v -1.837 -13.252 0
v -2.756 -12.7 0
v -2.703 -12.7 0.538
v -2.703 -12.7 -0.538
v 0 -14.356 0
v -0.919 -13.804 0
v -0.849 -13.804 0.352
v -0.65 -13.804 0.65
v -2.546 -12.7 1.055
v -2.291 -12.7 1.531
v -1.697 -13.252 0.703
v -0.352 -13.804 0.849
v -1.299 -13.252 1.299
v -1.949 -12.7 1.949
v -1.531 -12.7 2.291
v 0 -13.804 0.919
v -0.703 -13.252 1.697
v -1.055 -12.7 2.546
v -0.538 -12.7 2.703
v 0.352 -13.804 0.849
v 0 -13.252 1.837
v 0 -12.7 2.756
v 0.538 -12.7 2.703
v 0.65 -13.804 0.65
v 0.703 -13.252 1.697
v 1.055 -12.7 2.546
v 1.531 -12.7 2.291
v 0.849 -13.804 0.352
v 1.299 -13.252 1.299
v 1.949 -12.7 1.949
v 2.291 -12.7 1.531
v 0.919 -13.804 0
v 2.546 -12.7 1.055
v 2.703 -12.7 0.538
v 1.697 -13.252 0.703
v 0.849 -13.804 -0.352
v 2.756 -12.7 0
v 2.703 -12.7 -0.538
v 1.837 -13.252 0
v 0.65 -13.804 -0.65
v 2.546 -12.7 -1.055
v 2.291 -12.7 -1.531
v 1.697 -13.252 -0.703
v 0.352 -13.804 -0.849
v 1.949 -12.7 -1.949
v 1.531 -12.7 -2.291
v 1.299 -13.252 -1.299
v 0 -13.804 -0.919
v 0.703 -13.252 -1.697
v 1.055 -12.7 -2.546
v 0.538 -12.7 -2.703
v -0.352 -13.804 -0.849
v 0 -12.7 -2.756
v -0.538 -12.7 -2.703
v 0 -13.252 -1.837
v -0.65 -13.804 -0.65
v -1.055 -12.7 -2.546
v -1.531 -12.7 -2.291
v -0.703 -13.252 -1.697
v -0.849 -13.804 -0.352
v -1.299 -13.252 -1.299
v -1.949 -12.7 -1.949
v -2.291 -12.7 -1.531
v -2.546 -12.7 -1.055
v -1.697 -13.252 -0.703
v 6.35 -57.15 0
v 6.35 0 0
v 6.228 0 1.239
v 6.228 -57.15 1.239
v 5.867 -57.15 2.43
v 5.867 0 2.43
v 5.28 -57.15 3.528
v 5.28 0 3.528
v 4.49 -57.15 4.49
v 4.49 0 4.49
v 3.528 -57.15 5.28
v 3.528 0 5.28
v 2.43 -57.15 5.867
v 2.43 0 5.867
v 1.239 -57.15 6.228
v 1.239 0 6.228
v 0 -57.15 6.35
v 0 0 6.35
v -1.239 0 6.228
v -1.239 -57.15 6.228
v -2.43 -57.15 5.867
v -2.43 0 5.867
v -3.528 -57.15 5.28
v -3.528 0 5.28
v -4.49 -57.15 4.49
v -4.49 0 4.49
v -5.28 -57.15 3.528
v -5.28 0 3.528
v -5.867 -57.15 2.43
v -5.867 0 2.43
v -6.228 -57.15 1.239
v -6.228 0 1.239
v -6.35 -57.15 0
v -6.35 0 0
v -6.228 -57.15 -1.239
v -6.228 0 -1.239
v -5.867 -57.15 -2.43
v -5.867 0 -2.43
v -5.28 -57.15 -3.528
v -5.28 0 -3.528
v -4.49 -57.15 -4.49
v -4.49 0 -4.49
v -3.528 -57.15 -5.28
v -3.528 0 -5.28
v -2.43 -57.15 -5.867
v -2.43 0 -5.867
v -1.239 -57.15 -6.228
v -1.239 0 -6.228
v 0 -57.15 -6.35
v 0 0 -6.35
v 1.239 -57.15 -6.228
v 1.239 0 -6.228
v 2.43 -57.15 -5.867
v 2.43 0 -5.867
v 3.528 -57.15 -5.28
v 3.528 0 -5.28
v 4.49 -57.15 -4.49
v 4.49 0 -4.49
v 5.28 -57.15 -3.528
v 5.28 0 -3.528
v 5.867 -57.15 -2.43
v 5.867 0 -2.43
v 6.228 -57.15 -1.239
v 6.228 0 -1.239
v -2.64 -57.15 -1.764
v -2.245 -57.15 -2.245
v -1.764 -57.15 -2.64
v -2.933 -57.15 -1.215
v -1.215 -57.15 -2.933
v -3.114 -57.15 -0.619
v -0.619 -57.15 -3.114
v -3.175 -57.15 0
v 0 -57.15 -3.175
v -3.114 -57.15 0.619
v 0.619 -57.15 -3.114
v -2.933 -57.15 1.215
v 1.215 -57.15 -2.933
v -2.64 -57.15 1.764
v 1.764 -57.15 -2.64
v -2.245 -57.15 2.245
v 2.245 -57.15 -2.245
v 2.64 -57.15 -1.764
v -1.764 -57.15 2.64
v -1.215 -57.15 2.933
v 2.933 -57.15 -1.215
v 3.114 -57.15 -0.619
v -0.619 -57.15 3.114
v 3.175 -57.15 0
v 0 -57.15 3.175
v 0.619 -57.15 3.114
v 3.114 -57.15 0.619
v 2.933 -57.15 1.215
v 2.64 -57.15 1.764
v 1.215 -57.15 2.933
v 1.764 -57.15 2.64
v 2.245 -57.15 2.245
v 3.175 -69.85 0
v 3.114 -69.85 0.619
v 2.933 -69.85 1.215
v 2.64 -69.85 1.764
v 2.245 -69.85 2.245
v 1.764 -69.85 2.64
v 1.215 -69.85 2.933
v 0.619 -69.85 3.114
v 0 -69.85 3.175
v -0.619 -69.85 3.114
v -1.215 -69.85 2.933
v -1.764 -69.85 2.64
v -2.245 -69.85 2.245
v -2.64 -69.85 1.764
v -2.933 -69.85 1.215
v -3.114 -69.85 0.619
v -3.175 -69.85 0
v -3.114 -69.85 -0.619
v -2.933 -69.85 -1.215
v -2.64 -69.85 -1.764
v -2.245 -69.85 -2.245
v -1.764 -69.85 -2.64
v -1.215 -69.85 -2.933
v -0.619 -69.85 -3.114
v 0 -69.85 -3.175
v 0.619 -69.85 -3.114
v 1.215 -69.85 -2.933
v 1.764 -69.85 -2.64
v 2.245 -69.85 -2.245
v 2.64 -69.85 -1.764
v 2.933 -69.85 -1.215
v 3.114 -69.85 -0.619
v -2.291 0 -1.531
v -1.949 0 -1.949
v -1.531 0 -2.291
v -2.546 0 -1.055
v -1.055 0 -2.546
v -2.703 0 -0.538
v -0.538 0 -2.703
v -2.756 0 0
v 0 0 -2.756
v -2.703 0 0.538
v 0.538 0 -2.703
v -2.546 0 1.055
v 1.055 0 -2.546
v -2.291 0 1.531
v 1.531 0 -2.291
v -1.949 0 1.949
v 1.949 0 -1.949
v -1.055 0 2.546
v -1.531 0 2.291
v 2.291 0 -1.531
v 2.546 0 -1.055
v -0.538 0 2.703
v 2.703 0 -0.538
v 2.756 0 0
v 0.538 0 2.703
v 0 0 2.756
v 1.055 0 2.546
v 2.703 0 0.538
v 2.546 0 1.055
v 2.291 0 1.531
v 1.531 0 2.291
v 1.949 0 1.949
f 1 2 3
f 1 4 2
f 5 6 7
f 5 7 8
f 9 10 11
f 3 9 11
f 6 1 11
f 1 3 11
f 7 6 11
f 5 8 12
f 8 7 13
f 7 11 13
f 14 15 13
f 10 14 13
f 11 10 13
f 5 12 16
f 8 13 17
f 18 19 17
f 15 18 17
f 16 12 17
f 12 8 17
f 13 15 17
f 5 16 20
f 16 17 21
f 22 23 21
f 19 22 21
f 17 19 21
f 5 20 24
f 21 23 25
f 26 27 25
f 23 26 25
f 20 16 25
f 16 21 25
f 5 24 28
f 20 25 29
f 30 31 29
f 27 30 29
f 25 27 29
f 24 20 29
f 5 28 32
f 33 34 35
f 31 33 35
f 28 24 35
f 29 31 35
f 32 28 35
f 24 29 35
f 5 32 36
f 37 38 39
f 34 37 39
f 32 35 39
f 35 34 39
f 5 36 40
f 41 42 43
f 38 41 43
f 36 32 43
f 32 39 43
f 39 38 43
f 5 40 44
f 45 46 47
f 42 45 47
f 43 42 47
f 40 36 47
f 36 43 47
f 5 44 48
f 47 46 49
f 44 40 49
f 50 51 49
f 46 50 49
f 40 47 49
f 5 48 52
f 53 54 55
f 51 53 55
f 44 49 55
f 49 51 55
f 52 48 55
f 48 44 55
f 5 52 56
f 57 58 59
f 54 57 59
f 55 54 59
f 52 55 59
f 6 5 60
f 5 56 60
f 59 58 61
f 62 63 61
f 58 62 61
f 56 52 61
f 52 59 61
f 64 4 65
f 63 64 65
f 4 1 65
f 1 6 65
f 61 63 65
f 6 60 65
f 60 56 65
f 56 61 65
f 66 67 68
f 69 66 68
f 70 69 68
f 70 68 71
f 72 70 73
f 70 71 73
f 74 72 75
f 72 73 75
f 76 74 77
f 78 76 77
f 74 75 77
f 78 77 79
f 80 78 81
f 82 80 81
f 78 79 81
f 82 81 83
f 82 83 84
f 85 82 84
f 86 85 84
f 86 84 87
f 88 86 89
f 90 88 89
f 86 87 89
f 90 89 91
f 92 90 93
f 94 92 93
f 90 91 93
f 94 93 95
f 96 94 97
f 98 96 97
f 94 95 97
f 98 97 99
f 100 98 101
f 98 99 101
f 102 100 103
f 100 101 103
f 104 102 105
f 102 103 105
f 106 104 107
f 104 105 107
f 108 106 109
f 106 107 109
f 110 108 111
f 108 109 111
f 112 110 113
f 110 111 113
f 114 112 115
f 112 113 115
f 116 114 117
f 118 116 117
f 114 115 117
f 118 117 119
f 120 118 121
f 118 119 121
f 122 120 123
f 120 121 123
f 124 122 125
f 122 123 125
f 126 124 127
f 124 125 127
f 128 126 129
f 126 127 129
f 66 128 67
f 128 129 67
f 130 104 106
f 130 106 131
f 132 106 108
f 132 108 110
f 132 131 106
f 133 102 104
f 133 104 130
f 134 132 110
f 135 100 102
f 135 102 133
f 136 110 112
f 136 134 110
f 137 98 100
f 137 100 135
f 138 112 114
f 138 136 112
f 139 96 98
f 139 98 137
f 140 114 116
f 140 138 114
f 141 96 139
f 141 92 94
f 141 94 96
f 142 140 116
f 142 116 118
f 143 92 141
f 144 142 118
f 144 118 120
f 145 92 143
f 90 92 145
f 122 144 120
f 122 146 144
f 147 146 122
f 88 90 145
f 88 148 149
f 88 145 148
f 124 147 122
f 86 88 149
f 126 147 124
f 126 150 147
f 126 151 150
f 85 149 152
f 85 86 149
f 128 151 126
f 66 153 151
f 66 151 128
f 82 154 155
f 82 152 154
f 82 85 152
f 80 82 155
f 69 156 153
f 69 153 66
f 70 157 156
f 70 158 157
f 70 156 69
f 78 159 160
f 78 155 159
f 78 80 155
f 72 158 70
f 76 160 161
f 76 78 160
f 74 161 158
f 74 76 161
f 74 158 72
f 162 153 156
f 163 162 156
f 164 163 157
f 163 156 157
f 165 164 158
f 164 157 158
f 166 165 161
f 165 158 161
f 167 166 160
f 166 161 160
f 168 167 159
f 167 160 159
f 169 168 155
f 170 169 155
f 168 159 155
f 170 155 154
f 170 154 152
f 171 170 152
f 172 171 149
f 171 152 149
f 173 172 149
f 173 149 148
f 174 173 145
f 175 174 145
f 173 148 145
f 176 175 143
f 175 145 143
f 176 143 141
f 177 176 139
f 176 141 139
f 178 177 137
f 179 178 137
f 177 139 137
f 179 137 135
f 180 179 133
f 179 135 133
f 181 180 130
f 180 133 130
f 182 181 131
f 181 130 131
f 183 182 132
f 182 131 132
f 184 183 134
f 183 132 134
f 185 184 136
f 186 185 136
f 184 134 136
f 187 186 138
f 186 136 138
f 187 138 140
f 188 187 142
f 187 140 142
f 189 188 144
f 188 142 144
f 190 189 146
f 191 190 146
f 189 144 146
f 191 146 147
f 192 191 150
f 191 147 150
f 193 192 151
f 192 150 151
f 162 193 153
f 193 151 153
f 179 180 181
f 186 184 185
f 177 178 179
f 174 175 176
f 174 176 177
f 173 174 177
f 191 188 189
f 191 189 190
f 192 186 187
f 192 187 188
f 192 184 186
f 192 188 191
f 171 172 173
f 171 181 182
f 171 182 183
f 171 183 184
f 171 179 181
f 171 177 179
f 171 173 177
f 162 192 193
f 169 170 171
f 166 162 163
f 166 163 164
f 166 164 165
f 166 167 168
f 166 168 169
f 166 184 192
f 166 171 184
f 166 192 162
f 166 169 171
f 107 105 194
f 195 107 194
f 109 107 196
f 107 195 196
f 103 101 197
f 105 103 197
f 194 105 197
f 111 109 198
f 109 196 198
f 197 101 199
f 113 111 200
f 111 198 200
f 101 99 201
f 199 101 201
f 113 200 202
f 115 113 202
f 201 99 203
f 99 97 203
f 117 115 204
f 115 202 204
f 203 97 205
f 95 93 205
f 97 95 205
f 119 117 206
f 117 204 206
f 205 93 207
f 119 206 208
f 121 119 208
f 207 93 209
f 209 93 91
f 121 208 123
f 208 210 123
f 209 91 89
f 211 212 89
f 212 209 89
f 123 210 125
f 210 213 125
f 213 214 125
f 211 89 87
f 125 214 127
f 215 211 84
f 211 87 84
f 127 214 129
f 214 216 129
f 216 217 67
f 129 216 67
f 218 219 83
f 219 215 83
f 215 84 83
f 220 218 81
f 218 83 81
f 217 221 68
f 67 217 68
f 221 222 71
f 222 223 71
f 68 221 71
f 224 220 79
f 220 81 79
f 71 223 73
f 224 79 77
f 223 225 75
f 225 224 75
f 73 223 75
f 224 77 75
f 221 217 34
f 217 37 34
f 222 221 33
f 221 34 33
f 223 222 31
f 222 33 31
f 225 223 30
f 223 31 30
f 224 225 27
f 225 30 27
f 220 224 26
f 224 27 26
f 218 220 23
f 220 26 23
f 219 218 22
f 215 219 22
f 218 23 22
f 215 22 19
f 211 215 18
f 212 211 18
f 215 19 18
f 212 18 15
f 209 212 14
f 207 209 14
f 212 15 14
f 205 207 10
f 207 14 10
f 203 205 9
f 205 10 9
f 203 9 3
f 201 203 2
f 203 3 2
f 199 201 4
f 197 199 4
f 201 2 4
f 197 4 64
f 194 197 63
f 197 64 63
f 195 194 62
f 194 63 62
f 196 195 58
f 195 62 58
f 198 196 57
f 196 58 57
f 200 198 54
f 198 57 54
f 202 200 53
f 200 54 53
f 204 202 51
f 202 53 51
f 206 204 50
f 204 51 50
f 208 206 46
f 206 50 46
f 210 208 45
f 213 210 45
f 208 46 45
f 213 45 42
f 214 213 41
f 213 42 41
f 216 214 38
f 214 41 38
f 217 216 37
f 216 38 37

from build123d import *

# Parameters (mm, degrees)
F0_R     = 6.35
F1_DEPTH = 57.15
F2_R     = 3.175
F3_DEPTH = 12.7
F5_D     = 5.5118
F5_DEPTH = 12.7
F5_TIP   = 1.65591178


with BuildPart() as f1:
    # F0 (on Front) → F1 (new body)
    with BuildSketch(Plane.XZ):
        Circle(F0_R)
    extrude(amount=F1_DEPTH)

    # F2 (on face) → F3 (join)
    with BuildSketch(Plane.XZ.offset(57.15)):
        Circle(F2_R)
    extrude(amount=F3_DEPTH)

    # F5
    with Locations(Plane(origin=(0, 0, 0), x_dir=(-1, 0, 0), z_dir=(0, 1, 0))):
        with Locations((0, 0)):
            Hole(F5_D / 2, depth=F5_DEPTH)
            with Locations((0, 0, -(F5_DEPTH + F5_TIP / 2))):  # 118° drill point
                Cone(0, F5_D / 2, F5_TIP, mode=Mode.SUBTRACT)


solid = f1.part
